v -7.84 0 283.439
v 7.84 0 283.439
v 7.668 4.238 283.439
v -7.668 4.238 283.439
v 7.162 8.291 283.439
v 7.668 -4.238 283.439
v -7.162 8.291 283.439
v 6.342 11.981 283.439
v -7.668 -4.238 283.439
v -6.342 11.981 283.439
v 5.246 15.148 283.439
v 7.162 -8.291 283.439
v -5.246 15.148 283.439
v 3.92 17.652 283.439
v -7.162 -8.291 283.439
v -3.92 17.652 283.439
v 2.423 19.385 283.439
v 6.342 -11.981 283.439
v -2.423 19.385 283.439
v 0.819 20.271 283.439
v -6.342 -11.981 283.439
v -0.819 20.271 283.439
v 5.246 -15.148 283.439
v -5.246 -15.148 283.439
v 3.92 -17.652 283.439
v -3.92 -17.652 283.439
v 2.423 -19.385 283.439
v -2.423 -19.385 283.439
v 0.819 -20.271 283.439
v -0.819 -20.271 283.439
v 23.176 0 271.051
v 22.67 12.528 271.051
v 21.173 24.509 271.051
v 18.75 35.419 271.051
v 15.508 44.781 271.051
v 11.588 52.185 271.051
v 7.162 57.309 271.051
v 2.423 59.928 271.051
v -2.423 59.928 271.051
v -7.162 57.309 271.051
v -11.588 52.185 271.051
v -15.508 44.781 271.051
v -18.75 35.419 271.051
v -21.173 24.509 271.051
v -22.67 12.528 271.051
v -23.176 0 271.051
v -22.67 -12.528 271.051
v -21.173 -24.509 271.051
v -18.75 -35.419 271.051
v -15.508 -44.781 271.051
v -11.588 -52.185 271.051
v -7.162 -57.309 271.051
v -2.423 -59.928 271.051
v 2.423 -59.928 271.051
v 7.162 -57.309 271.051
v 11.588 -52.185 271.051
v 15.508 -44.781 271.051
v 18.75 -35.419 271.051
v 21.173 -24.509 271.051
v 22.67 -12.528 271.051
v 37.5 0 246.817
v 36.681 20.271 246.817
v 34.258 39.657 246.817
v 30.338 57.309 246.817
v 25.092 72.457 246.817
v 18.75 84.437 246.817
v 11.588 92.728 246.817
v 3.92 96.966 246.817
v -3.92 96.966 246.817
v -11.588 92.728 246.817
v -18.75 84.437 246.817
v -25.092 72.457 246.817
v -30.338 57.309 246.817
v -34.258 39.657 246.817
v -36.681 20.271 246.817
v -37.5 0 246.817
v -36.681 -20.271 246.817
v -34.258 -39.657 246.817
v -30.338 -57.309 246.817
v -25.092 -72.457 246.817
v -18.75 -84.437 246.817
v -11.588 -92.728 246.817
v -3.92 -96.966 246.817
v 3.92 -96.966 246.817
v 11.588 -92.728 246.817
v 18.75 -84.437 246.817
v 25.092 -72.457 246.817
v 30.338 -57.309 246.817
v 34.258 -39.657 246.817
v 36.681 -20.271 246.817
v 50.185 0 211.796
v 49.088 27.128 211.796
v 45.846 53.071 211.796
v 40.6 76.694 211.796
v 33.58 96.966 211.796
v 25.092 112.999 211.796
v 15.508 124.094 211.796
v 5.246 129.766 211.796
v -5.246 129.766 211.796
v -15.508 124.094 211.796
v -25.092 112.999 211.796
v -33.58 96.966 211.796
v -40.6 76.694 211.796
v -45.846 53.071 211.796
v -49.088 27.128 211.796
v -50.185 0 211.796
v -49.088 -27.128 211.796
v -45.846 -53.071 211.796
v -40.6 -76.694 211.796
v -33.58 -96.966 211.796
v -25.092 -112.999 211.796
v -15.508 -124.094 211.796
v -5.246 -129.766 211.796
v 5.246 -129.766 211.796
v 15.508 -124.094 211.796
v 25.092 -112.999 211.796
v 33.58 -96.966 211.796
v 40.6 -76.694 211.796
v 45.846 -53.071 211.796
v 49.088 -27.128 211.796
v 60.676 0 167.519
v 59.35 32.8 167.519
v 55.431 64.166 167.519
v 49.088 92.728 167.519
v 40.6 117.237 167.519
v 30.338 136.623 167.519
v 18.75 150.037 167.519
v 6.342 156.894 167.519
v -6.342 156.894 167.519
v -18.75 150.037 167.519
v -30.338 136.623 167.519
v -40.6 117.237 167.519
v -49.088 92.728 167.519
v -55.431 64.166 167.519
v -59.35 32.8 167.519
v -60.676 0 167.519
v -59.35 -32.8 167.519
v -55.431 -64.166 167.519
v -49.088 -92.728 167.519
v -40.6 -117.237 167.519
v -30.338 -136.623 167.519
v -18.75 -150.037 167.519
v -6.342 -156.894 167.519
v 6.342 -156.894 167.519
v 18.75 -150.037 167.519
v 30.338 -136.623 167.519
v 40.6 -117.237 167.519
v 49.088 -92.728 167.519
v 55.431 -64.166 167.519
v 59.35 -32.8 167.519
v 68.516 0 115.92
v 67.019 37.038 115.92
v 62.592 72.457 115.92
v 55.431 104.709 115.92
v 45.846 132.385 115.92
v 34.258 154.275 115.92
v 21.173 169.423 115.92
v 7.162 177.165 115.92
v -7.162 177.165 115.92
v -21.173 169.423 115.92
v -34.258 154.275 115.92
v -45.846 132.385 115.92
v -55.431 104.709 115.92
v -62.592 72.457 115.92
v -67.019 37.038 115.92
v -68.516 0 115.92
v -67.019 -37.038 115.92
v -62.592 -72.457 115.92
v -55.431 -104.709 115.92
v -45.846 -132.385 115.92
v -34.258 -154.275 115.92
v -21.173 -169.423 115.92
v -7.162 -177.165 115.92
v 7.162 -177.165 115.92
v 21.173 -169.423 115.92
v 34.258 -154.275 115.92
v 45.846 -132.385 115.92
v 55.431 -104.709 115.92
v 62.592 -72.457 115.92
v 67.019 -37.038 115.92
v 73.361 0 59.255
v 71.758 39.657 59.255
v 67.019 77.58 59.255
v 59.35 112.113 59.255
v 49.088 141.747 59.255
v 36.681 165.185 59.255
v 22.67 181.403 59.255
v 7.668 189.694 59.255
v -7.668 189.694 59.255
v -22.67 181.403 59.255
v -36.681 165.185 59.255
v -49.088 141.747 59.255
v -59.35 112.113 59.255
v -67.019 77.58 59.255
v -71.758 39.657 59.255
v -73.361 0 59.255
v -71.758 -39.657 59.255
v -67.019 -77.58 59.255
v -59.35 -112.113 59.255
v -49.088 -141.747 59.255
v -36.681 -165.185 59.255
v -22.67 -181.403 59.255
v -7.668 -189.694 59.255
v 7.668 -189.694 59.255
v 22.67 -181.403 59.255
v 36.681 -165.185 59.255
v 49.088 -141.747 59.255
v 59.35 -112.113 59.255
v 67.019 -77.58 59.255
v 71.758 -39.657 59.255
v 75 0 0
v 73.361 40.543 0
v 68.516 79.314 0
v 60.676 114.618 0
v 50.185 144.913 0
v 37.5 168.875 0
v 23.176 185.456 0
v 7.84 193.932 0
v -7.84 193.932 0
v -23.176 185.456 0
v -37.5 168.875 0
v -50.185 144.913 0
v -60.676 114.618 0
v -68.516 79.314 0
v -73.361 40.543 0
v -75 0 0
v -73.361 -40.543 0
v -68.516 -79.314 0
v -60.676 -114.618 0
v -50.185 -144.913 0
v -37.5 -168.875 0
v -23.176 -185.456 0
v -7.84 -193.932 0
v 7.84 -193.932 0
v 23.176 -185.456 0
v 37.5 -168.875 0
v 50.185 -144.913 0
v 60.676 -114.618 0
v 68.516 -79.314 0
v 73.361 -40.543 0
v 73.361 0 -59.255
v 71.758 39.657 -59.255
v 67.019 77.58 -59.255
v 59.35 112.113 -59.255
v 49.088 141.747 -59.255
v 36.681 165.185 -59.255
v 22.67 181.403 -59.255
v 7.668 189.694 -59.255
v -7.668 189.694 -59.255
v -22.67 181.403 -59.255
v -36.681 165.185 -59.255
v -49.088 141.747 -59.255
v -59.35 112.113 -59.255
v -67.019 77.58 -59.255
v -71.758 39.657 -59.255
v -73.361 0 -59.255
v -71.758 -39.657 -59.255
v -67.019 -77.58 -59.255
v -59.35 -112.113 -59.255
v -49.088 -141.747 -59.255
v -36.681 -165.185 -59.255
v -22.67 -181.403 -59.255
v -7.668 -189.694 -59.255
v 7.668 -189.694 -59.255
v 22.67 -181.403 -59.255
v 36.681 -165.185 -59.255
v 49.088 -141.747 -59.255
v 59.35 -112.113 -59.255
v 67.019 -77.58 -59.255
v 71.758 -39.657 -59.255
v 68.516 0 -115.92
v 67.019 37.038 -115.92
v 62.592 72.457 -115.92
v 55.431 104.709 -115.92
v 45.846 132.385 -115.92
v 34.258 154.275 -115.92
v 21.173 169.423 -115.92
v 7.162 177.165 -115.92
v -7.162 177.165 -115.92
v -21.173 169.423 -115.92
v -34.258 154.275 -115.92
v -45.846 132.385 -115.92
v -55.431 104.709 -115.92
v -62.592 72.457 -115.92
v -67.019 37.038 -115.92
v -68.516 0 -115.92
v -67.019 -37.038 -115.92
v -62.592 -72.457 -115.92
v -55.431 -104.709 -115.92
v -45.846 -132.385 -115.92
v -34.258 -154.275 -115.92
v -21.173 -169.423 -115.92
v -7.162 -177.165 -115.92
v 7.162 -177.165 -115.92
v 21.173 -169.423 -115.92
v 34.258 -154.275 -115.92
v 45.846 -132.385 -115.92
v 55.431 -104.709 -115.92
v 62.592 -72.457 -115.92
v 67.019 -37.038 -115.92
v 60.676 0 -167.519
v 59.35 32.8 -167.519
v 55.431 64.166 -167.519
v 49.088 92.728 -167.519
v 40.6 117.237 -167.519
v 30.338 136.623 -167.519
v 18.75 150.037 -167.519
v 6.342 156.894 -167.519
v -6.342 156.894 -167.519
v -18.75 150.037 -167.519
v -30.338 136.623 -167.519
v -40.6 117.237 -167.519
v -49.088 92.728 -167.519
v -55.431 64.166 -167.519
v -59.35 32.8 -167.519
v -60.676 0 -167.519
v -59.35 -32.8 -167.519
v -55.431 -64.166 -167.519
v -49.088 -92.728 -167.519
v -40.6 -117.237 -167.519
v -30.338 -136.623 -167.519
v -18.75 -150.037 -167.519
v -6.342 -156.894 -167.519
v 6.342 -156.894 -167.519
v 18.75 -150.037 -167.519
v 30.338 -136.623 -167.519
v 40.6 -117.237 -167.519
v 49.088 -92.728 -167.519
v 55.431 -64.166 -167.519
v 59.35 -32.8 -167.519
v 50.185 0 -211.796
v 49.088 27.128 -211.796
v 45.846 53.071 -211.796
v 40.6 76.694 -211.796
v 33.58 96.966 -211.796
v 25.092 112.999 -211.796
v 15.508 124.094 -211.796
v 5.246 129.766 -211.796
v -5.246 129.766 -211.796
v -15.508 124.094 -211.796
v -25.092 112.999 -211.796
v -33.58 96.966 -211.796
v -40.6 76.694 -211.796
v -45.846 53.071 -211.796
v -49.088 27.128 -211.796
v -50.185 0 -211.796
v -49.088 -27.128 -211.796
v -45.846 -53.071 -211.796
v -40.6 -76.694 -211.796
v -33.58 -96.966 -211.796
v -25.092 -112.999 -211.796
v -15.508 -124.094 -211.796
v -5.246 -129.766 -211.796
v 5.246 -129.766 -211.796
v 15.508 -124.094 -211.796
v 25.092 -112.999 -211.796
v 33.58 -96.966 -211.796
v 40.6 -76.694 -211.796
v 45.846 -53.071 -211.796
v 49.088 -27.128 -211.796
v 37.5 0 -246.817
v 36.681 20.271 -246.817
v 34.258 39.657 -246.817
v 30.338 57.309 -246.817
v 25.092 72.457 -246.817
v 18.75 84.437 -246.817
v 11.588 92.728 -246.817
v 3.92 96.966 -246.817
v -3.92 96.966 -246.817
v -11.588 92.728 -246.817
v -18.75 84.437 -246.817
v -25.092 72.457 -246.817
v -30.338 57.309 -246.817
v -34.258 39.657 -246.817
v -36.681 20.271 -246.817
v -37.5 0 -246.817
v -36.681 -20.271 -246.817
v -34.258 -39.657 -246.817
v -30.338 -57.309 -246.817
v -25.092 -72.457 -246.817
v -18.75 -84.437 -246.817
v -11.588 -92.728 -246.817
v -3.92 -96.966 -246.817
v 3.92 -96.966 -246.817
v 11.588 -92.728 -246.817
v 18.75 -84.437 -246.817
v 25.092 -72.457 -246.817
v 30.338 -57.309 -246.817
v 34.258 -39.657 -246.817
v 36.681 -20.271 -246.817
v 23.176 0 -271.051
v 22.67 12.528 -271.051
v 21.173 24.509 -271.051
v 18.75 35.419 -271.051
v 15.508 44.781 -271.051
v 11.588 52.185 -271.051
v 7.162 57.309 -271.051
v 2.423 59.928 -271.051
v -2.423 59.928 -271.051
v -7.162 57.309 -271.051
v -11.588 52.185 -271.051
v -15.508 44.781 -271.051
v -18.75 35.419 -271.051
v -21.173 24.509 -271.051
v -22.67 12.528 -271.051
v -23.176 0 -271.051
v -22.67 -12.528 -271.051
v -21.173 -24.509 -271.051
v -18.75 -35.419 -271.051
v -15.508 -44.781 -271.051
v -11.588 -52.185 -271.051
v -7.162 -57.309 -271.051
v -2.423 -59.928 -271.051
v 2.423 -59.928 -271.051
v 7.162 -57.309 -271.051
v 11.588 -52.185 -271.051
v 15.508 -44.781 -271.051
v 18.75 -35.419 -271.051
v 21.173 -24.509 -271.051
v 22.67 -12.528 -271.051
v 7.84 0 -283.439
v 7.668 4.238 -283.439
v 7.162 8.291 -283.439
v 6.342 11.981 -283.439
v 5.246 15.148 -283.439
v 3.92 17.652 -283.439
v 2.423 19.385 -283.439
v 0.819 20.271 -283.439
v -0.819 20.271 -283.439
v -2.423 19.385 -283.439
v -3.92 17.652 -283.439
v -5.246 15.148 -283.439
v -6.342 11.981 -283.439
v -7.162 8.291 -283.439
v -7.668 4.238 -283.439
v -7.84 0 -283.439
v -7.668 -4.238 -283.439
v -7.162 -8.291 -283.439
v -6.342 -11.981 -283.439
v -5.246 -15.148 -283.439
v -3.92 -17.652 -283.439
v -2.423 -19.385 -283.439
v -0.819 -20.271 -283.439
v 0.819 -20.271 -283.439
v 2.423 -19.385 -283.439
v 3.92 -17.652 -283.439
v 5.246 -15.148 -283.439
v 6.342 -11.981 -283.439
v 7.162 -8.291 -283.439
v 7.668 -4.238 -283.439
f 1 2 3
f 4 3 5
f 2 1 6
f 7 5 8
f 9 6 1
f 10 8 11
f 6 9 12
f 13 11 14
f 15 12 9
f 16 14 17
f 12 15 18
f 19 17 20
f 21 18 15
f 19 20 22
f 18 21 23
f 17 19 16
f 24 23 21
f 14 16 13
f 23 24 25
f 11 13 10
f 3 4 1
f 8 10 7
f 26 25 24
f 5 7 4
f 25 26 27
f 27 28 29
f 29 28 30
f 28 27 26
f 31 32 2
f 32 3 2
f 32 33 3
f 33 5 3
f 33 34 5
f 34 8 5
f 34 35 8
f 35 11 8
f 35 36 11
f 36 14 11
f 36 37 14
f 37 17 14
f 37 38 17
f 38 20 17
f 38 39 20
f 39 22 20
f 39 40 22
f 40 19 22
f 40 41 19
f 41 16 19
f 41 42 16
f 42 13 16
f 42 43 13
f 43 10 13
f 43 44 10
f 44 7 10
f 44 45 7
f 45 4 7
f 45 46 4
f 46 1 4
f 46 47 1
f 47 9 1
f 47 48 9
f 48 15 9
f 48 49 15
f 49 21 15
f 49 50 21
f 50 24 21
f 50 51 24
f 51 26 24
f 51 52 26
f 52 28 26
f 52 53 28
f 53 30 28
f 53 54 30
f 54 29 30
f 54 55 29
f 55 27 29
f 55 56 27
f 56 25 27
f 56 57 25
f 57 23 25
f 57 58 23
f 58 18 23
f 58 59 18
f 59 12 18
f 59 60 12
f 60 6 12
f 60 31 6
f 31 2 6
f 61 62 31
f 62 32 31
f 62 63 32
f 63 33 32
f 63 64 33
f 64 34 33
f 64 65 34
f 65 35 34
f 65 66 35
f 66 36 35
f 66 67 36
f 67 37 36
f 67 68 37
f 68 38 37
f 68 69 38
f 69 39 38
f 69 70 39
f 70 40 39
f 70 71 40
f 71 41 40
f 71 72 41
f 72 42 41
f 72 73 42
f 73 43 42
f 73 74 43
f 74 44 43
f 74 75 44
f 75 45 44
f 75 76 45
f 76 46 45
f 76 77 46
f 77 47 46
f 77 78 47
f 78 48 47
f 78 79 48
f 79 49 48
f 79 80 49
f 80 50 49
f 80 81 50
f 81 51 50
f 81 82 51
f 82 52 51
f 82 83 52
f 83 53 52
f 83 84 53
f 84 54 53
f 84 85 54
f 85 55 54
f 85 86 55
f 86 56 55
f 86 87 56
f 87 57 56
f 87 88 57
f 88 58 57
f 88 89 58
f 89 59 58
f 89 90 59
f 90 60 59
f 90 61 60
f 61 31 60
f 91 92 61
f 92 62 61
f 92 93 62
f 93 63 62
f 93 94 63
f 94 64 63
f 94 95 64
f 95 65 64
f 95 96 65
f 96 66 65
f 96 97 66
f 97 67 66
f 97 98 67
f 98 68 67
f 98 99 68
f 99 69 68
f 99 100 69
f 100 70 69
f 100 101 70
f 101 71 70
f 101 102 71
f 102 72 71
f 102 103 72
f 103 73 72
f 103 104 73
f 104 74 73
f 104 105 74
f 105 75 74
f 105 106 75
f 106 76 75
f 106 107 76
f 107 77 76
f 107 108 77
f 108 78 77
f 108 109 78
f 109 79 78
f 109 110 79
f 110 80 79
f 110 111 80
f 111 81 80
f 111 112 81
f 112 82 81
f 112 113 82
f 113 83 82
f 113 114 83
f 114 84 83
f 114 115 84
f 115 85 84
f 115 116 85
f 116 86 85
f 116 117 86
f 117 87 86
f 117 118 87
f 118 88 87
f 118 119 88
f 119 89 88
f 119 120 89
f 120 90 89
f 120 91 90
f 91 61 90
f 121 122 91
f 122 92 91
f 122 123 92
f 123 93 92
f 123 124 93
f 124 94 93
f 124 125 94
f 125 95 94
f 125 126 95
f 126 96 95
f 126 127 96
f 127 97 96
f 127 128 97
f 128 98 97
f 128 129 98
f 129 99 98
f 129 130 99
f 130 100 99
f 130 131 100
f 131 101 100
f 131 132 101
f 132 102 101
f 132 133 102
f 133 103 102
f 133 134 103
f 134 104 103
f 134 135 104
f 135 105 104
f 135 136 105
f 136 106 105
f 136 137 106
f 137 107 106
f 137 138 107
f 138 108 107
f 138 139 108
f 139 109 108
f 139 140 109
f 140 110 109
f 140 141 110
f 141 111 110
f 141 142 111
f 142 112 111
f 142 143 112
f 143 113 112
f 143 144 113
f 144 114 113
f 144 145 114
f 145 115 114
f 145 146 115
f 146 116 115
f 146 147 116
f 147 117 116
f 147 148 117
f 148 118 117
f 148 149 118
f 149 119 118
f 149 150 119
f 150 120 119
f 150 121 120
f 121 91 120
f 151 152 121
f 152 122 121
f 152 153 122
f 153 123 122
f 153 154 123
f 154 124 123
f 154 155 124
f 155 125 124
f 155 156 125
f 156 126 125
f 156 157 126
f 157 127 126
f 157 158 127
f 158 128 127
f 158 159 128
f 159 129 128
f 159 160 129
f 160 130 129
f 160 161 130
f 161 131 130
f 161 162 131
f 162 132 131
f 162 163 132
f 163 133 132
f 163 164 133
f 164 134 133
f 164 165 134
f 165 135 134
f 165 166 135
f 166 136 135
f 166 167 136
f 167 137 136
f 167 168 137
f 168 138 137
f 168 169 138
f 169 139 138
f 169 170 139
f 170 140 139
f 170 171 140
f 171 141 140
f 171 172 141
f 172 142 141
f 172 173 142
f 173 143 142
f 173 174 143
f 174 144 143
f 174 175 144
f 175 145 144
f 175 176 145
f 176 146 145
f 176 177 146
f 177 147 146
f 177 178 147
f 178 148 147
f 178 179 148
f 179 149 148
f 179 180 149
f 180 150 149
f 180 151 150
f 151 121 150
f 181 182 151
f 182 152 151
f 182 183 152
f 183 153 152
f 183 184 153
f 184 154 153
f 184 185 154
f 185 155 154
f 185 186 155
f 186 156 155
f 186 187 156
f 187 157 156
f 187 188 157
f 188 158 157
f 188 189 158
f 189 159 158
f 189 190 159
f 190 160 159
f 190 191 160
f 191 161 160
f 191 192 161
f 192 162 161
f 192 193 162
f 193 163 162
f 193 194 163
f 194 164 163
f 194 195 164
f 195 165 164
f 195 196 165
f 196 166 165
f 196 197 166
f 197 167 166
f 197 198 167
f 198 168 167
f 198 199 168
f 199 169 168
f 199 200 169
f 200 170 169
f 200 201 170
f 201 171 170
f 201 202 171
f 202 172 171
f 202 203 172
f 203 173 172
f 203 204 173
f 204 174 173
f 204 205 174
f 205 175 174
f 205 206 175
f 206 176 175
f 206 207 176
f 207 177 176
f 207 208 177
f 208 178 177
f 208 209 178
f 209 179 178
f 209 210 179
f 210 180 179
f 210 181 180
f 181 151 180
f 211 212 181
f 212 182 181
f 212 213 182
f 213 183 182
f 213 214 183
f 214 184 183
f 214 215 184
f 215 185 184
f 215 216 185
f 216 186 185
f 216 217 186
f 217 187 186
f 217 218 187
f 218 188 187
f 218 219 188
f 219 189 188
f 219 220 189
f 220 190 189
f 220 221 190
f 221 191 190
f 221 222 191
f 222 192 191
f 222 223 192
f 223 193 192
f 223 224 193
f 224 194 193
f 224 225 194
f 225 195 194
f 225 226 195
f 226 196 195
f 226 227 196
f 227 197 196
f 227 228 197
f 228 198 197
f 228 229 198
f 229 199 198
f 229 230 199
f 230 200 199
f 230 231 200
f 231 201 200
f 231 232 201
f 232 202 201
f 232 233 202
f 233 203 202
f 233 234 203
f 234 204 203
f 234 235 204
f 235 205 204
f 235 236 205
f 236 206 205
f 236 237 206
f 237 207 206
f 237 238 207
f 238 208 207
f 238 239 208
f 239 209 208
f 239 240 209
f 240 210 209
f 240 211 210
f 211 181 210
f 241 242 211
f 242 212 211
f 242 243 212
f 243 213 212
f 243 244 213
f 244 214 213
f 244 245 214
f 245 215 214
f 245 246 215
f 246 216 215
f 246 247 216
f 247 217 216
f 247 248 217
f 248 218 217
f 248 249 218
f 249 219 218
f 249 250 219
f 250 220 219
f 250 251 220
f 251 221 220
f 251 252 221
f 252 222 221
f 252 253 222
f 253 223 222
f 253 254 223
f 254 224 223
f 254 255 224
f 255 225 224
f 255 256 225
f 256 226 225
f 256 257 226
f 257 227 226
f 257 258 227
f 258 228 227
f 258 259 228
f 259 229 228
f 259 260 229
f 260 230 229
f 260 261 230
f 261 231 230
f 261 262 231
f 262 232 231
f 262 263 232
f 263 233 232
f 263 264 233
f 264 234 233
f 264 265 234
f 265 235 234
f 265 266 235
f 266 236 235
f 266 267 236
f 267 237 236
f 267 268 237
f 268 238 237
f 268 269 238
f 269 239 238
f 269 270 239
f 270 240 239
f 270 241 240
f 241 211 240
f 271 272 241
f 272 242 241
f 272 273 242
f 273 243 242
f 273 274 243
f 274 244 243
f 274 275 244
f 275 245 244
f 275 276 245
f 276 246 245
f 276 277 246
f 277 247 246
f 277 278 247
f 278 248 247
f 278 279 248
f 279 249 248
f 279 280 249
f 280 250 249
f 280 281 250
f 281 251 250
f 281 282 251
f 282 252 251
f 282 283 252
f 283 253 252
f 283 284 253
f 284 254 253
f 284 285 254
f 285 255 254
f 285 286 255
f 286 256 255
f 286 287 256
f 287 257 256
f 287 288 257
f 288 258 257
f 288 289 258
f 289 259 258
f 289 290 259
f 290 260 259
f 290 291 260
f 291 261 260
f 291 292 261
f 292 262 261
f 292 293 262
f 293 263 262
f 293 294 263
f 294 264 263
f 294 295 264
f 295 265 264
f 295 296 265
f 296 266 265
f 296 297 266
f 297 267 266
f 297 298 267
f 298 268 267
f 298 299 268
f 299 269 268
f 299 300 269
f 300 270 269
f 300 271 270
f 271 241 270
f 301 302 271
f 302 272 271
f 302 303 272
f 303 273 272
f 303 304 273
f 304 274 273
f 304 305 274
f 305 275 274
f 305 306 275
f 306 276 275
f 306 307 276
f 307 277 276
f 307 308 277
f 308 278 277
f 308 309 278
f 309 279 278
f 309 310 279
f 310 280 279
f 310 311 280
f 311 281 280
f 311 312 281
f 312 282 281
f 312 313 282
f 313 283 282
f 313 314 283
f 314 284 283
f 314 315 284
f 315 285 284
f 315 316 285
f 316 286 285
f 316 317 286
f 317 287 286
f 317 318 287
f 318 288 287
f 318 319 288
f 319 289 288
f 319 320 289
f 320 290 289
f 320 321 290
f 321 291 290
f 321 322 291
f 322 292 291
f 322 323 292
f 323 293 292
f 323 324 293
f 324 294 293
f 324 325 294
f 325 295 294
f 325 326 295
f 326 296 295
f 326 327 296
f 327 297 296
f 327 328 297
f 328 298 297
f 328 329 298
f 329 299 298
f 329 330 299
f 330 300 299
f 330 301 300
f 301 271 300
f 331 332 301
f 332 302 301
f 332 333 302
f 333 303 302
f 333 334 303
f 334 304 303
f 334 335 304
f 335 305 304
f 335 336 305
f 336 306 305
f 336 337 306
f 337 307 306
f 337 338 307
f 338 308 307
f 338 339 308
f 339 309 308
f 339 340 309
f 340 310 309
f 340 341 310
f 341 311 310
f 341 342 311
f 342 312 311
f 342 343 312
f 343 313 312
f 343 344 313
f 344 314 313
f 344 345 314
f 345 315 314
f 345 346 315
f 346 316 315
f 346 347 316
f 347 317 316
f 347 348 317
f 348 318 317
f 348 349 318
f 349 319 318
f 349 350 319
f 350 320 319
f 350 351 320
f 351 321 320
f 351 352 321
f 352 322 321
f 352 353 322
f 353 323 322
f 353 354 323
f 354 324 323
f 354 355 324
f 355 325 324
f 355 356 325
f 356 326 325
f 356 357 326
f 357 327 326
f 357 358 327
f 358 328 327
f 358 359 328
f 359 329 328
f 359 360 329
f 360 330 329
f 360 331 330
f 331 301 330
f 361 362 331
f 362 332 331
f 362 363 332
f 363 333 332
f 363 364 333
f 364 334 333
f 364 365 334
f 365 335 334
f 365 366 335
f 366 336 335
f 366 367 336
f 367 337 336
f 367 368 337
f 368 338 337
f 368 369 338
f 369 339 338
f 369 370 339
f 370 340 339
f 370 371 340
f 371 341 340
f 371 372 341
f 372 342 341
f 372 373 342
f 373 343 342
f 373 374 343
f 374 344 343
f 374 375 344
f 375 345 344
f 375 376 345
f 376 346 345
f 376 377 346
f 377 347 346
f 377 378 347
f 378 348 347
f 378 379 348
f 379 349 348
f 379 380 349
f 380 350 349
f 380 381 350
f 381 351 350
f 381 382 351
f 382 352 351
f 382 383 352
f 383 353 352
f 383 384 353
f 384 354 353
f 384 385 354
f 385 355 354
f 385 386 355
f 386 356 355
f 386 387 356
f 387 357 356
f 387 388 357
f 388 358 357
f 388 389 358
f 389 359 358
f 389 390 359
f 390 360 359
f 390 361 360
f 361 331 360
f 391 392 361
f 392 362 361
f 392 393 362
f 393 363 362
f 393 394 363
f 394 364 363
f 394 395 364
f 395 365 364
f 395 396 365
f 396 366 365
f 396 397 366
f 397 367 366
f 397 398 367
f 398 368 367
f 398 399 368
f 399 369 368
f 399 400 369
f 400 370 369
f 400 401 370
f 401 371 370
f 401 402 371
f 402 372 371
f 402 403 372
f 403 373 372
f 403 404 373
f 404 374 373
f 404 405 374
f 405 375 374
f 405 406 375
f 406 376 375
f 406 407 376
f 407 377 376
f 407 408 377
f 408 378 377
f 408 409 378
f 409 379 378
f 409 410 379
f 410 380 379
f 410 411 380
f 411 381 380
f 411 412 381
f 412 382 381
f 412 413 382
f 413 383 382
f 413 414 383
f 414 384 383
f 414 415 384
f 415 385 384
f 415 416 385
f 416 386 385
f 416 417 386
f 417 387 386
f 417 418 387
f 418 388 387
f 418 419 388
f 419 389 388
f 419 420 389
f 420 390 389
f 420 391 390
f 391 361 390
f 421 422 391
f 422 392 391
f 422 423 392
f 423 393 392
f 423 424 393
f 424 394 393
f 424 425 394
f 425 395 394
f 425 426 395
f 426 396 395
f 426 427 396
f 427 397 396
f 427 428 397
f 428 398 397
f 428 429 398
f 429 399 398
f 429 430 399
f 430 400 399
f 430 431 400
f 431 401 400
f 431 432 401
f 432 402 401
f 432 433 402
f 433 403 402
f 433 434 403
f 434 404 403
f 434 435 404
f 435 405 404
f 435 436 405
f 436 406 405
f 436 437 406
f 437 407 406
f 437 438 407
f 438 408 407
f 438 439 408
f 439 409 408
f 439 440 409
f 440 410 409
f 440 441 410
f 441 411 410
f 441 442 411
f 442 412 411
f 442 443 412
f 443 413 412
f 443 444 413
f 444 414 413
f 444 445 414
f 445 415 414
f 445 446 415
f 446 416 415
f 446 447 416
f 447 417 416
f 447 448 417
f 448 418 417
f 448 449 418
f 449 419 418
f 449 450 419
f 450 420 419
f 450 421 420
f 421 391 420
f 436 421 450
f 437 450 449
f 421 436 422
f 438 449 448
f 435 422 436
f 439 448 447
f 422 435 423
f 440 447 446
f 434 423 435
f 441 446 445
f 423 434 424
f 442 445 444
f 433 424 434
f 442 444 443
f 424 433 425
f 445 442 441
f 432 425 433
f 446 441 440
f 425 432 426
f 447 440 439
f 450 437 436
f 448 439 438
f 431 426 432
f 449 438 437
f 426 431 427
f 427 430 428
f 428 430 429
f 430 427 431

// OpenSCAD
// Generated by SolidPython 1.0.1 on 2020-07-29 00:46:46


scale(v = [5, 13, 19]) {
	sphere(r = 15);
}
/***********************************************
*********      SolidPython code:      **********
************************************************
 
# import packages: SolidPython
from solid import *
from solid.utils import *
from itertools import chain, combinations, permutations


class Resize:

    def __init__(self, scad_file):
        self.scad_file = scad_file
        #self.scad_file = import_scad(scad_file)
        # cone/cylinder param:
        self.r1 = 0
        self.r2 = 0
        self.h = 0
        # rectangular prism param:
        self.w = 0
        self.l = 0
        # ellipse param:
        self.r = 0

    # import OpenScad code (file name corresponds to shape)


    # classify shape + parameters
    def assign(self, param1, param2, param3):
        if self.scad_file == 'cone.scad':
            self.r1 = param1
            self.r2 = param2
            self.h = param3
        elif self.scad_file == 'cylinder.scad':
            self.r1 = param1
            self.r2 = param2
            self.h = param3
        elif self.scad_file == 'rectangularPrism.scad':
            self.h = param1
            self.l = param2
            self.w = param3
        else:
            self.r = param1
            self.h = param2

    # resize parameters
    def iterate(self):
        x = range(3, 20, 2)
        i = 1
        if self.scad_file == 'cone.scad':
            tempList = list(permutations(x, 2))
            for temp in tempList:
                param1 = temp[0]
                param2 = temp[1]
                filepath = 'produced_scad_files/' + 'cone' + str(param1) + '_' + str(param2) + '_' + '.scad'
                scad_render_to_file(cylinder(h=param1, r1=param2, r2=0), filepath)

        elif self.scad_file == 'cylinder.scad':
            tempList = list(permutations(x, 3))
            for temp in tempList:
                param1 = temp[0]
                param2 = temp[1]
                filepath = 'produced_scad_files/' + 'cylinder' + str(param1) + '_' + str(param2) + '_' + '.scad'
                scad_render_to_file(cylinder(h=param1, r1=param2, r2=param2), filepath)

        elif self.scad_file == 'rectangularPrism.scad':
            tempList = list(permutations(x, 3))
            for temp in tempList:
                param1 = temp[0]
                param2 = temp[1]
                param3 = temp[2]
                filepath = 'produced_scad_files/' + 'rectangularPrism' + str(param1) + '_' + str(param2) + '_' + str(
                    param3) + '.scad'
                scad_render_to_file(cube(size=(param1, param2, param3)), filepath)

        elif self.scad_file == 'ellipse.scad':
            tempList = list(permutations(x, 4))
            for temp in tempList:
                param1 = temp[0]
                param2 = temp[1]
                param3 = temp[2]
                param4 = temp[3]
                filepath = 'produced_scad_files/' + 'ellipse' + str(param1) + '_' + str(param2) + '_' + str(param3) + '_' + str(param4) + '.scad'
                scad_render_to_file(scale([param1, param2, param3])(sphere(r=param4)), filepath)

    def render_to_scadfile(self):
        scad_render_to_file(scad, 'example.scad') 
 
************************************************/
